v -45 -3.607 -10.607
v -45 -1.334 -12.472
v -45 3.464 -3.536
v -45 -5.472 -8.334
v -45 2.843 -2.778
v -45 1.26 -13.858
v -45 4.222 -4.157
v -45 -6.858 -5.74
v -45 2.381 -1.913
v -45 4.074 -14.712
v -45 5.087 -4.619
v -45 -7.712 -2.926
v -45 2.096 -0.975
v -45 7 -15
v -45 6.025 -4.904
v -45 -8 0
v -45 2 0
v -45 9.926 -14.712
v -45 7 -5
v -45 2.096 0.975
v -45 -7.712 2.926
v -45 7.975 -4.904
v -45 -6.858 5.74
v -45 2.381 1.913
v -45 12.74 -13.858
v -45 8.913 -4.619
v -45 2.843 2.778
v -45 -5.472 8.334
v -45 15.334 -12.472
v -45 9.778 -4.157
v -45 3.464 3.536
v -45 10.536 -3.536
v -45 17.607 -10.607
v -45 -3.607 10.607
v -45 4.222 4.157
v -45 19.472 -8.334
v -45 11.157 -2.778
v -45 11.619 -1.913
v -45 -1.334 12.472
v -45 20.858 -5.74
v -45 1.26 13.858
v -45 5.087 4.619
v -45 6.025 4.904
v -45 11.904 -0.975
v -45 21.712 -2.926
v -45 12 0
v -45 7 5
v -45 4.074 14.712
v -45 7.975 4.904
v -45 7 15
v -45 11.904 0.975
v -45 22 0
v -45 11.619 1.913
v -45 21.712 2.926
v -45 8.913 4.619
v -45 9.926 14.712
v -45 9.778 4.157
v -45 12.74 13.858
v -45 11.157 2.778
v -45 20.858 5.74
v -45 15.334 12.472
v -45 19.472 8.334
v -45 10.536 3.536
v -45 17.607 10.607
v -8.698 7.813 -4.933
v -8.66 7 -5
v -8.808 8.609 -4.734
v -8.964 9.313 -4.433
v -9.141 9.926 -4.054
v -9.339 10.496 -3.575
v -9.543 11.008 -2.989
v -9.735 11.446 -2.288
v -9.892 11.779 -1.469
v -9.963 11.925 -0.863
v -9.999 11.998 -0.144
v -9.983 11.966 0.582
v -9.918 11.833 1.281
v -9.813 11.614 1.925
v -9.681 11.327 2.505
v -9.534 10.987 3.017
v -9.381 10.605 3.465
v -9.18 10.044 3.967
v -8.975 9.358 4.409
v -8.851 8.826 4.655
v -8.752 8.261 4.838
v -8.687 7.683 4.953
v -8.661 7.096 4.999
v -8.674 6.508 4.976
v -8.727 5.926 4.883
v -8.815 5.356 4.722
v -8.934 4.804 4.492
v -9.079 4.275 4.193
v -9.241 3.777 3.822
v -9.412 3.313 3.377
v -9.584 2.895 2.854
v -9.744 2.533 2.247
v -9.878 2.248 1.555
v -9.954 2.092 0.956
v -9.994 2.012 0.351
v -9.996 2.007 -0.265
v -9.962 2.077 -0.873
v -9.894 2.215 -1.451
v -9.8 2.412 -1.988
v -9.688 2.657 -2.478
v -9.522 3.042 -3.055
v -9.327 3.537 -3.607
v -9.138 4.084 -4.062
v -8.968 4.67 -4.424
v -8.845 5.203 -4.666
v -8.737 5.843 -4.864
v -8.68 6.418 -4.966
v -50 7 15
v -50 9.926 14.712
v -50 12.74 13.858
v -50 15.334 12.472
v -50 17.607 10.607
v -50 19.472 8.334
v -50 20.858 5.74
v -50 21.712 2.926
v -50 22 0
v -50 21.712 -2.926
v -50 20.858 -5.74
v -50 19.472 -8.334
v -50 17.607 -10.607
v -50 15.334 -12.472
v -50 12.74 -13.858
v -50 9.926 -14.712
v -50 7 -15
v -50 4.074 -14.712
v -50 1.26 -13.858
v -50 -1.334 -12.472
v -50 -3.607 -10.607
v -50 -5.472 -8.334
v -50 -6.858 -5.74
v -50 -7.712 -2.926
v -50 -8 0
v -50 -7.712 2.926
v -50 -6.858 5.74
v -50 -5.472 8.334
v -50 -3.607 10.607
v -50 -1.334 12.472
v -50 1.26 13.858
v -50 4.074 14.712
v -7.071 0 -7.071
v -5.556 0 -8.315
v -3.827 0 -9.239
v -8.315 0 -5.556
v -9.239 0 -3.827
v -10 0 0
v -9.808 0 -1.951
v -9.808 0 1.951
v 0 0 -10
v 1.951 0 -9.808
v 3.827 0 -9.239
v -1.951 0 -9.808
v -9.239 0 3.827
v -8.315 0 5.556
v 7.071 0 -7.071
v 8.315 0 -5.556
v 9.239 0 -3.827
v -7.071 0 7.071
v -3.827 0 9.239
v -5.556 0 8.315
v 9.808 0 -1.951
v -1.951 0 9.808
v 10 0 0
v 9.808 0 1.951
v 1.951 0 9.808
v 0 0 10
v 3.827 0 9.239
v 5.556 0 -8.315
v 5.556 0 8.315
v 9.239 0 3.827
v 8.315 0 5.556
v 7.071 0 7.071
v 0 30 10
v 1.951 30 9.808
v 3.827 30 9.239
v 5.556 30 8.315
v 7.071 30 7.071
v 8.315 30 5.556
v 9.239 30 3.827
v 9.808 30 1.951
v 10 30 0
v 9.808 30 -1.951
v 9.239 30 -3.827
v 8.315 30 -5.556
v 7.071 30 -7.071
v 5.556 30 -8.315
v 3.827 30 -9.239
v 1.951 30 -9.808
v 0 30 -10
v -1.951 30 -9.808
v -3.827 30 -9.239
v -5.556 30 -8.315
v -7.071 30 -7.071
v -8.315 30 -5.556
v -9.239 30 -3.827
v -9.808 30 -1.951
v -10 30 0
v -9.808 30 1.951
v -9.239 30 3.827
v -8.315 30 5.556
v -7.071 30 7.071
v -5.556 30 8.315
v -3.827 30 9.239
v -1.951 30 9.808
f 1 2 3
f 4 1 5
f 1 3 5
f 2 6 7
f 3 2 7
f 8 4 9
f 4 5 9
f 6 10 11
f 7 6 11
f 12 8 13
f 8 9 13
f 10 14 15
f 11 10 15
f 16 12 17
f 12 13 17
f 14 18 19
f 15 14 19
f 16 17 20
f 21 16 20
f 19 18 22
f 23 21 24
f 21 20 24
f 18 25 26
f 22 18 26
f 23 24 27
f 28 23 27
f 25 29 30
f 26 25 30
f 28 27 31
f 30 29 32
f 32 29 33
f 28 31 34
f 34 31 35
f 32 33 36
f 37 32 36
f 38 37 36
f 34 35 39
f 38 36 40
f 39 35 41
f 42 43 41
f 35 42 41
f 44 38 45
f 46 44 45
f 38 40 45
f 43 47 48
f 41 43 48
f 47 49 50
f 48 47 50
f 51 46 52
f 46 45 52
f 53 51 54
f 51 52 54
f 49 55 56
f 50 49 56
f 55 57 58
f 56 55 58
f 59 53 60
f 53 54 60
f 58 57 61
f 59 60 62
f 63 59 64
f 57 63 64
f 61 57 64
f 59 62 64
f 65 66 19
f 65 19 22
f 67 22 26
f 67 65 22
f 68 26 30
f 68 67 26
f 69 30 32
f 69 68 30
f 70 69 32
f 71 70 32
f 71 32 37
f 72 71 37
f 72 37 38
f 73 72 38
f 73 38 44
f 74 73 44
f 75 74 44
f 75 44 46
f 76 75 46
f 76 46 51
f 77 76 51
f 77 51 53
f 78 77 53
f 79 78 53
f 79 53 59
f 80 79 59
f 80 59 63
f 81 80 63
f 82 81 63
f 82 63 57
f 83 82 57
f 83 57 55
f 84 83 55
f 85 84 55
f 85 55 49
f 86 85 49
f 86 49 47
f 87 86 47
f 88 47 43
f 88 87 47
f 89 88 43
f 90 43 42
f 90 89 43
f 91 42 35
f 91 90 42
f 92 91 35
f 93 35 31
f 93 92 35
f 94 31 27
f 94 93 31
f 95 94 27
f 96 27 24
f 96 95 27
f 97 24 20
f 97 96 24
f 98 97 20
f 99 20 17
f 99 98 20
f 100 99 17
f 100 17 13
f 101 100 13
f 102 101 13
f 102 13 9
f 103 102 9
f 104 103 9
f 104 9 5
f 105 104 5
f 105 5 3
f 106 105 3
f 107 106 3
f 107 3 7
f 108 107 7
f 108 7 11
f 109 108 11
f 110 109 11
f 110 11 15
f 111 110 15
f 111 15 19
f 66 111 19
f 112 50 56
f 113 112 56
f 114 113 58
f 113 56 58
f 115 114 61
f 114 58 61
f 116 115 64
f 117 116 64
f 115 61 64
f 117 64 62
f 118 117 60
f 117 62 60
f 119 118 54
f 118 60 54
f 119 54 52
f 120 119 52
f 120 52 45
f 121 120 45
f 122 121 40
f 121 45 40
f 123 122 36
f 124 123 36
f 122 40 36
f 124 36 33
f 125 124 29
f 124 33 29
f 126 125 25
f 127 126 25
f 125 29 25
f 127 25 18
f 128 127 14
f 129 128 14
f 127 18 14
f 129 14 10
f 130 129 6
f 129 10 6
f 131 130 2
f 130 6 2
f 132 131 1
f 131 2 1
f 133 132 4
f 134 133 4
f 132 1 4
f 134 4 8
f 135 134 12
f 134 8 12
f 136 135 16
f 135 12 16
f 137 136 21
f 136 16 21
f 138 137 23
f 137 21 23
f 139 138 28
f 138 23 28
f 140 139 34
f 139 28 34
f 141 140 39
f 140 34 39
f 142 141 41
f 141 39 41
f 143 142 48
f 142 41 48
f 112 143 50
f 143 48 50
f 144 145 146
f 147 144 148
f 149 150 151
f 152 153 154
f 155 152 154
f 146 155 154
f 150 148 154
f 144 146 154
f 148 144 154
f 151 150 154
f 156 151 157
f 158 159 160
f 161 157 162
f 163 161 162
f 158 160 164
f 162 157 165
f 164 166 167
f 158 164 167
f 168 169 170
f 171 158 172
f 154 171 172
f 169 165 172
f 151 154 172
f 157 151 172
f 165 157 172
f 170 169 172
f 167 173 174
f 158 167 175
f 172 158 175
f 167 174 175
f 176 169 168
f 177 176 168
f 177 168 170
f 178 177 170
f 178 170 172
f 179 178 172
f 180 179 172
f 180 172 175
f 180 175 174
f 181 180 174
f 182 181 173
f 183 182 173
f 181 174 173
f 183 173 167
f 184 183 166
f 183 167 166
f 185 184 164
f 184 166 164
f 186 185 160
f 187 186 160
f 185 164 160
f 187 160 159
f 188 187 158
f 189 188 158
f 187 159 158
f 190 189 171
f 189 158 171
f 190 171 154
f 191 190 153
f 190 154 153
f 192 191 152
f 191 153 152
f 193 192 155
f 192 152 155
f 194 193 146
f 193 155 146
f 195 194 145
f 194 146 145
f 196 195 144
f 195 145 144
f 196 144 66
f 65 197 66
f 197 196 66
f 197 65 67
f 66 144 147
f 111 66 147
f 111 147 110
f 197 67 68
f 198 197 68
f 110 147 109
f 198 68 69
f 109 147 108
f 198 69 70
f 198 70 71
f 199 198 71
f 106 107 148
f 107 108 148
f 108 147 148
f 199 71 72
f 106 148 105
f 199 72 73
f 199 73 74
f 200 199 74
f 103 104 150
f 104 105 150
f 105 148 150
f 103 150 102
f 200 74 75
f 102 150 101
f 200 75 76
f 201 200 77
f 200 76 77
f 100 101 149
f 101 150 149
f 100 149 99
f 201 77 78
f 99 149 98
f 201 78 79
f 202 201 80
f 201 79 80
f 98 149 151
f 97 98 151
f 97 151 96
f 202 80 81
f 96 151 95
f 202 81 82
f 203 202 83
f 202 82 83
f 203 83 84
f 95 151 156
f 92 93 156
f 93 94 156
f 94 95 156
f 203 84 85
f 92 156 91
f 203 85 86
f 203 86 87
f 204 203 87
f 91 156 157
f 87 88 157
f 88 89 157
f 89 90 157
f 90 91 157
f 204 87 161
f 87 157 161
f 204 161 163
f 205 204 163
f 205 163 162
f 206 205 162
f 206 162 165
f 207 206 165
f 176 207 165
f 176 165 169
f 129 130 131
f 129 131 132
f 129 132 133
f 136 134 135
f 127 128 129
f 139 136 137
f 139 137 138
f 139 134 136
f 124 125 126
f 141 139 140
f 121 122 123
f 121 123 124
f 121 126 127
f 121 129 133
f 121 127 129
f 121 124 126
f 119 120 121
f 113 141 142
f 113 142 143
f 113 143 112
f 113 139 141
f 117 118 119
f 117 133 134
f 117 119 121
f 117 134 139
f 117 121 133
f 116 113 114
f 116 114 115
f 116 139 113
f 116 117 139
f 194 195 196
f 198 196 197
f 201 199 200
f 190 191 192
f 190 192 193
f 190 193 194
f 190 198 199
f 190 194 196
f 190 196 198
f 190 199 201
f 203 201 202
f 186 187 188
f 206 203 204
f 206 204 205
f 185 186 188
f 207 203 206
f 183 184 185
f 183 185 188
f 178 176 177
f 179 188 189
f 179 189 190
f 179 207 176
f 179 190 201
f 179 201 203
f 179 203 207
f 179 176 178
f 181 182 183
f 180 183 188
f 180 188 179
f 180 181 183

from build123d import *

# Parameters (mm, degrees)
SKETCH_1_R      = 10
EXTRUDE_1_DEPTH = 30
SKETCH_3_R      = 5
EXTRUDE_3_DEPTH = 45
SKETCH_4_R      = 15
EXTRUDE_4_DEPTH = 5


with BuildPart() as part:
    # 草图1 → 凸台-拉伸1 (new body)
    with BuildSketch(Plane(origin=(0, 0, 0), x_dir=(1, 0, 0), z_dir=(0, 1, 0))):
        with Locations(Location((0, 0, 0), (0, 0, 270))):
            Circle(SKETCH_1_R)
    extrude(amount=EXTRUDE_1_DEPTH)

    # 草图3 → 凸台-拉伸3 (add)
    with BuildSketch(Plane(origin=(0, 0, 0), x_dir=(0, 0, -1), z_dir=(1, 0, 0))):
        with Locations((0, 7)):
            Circle(SKETCH_3_R)
    extrude(amount=-EXTRUDE_3_DEPTH)

    # 草图4 → 凸台-拉伸4 (add)
    with BuildSketch(Plane.ZY.offset(45)):
        with Locations((0, 7)):
            Circle(SKETCH_4_R)
    extrude(amount=EXTRUDE_4_DEPTH)


solid = part.part
